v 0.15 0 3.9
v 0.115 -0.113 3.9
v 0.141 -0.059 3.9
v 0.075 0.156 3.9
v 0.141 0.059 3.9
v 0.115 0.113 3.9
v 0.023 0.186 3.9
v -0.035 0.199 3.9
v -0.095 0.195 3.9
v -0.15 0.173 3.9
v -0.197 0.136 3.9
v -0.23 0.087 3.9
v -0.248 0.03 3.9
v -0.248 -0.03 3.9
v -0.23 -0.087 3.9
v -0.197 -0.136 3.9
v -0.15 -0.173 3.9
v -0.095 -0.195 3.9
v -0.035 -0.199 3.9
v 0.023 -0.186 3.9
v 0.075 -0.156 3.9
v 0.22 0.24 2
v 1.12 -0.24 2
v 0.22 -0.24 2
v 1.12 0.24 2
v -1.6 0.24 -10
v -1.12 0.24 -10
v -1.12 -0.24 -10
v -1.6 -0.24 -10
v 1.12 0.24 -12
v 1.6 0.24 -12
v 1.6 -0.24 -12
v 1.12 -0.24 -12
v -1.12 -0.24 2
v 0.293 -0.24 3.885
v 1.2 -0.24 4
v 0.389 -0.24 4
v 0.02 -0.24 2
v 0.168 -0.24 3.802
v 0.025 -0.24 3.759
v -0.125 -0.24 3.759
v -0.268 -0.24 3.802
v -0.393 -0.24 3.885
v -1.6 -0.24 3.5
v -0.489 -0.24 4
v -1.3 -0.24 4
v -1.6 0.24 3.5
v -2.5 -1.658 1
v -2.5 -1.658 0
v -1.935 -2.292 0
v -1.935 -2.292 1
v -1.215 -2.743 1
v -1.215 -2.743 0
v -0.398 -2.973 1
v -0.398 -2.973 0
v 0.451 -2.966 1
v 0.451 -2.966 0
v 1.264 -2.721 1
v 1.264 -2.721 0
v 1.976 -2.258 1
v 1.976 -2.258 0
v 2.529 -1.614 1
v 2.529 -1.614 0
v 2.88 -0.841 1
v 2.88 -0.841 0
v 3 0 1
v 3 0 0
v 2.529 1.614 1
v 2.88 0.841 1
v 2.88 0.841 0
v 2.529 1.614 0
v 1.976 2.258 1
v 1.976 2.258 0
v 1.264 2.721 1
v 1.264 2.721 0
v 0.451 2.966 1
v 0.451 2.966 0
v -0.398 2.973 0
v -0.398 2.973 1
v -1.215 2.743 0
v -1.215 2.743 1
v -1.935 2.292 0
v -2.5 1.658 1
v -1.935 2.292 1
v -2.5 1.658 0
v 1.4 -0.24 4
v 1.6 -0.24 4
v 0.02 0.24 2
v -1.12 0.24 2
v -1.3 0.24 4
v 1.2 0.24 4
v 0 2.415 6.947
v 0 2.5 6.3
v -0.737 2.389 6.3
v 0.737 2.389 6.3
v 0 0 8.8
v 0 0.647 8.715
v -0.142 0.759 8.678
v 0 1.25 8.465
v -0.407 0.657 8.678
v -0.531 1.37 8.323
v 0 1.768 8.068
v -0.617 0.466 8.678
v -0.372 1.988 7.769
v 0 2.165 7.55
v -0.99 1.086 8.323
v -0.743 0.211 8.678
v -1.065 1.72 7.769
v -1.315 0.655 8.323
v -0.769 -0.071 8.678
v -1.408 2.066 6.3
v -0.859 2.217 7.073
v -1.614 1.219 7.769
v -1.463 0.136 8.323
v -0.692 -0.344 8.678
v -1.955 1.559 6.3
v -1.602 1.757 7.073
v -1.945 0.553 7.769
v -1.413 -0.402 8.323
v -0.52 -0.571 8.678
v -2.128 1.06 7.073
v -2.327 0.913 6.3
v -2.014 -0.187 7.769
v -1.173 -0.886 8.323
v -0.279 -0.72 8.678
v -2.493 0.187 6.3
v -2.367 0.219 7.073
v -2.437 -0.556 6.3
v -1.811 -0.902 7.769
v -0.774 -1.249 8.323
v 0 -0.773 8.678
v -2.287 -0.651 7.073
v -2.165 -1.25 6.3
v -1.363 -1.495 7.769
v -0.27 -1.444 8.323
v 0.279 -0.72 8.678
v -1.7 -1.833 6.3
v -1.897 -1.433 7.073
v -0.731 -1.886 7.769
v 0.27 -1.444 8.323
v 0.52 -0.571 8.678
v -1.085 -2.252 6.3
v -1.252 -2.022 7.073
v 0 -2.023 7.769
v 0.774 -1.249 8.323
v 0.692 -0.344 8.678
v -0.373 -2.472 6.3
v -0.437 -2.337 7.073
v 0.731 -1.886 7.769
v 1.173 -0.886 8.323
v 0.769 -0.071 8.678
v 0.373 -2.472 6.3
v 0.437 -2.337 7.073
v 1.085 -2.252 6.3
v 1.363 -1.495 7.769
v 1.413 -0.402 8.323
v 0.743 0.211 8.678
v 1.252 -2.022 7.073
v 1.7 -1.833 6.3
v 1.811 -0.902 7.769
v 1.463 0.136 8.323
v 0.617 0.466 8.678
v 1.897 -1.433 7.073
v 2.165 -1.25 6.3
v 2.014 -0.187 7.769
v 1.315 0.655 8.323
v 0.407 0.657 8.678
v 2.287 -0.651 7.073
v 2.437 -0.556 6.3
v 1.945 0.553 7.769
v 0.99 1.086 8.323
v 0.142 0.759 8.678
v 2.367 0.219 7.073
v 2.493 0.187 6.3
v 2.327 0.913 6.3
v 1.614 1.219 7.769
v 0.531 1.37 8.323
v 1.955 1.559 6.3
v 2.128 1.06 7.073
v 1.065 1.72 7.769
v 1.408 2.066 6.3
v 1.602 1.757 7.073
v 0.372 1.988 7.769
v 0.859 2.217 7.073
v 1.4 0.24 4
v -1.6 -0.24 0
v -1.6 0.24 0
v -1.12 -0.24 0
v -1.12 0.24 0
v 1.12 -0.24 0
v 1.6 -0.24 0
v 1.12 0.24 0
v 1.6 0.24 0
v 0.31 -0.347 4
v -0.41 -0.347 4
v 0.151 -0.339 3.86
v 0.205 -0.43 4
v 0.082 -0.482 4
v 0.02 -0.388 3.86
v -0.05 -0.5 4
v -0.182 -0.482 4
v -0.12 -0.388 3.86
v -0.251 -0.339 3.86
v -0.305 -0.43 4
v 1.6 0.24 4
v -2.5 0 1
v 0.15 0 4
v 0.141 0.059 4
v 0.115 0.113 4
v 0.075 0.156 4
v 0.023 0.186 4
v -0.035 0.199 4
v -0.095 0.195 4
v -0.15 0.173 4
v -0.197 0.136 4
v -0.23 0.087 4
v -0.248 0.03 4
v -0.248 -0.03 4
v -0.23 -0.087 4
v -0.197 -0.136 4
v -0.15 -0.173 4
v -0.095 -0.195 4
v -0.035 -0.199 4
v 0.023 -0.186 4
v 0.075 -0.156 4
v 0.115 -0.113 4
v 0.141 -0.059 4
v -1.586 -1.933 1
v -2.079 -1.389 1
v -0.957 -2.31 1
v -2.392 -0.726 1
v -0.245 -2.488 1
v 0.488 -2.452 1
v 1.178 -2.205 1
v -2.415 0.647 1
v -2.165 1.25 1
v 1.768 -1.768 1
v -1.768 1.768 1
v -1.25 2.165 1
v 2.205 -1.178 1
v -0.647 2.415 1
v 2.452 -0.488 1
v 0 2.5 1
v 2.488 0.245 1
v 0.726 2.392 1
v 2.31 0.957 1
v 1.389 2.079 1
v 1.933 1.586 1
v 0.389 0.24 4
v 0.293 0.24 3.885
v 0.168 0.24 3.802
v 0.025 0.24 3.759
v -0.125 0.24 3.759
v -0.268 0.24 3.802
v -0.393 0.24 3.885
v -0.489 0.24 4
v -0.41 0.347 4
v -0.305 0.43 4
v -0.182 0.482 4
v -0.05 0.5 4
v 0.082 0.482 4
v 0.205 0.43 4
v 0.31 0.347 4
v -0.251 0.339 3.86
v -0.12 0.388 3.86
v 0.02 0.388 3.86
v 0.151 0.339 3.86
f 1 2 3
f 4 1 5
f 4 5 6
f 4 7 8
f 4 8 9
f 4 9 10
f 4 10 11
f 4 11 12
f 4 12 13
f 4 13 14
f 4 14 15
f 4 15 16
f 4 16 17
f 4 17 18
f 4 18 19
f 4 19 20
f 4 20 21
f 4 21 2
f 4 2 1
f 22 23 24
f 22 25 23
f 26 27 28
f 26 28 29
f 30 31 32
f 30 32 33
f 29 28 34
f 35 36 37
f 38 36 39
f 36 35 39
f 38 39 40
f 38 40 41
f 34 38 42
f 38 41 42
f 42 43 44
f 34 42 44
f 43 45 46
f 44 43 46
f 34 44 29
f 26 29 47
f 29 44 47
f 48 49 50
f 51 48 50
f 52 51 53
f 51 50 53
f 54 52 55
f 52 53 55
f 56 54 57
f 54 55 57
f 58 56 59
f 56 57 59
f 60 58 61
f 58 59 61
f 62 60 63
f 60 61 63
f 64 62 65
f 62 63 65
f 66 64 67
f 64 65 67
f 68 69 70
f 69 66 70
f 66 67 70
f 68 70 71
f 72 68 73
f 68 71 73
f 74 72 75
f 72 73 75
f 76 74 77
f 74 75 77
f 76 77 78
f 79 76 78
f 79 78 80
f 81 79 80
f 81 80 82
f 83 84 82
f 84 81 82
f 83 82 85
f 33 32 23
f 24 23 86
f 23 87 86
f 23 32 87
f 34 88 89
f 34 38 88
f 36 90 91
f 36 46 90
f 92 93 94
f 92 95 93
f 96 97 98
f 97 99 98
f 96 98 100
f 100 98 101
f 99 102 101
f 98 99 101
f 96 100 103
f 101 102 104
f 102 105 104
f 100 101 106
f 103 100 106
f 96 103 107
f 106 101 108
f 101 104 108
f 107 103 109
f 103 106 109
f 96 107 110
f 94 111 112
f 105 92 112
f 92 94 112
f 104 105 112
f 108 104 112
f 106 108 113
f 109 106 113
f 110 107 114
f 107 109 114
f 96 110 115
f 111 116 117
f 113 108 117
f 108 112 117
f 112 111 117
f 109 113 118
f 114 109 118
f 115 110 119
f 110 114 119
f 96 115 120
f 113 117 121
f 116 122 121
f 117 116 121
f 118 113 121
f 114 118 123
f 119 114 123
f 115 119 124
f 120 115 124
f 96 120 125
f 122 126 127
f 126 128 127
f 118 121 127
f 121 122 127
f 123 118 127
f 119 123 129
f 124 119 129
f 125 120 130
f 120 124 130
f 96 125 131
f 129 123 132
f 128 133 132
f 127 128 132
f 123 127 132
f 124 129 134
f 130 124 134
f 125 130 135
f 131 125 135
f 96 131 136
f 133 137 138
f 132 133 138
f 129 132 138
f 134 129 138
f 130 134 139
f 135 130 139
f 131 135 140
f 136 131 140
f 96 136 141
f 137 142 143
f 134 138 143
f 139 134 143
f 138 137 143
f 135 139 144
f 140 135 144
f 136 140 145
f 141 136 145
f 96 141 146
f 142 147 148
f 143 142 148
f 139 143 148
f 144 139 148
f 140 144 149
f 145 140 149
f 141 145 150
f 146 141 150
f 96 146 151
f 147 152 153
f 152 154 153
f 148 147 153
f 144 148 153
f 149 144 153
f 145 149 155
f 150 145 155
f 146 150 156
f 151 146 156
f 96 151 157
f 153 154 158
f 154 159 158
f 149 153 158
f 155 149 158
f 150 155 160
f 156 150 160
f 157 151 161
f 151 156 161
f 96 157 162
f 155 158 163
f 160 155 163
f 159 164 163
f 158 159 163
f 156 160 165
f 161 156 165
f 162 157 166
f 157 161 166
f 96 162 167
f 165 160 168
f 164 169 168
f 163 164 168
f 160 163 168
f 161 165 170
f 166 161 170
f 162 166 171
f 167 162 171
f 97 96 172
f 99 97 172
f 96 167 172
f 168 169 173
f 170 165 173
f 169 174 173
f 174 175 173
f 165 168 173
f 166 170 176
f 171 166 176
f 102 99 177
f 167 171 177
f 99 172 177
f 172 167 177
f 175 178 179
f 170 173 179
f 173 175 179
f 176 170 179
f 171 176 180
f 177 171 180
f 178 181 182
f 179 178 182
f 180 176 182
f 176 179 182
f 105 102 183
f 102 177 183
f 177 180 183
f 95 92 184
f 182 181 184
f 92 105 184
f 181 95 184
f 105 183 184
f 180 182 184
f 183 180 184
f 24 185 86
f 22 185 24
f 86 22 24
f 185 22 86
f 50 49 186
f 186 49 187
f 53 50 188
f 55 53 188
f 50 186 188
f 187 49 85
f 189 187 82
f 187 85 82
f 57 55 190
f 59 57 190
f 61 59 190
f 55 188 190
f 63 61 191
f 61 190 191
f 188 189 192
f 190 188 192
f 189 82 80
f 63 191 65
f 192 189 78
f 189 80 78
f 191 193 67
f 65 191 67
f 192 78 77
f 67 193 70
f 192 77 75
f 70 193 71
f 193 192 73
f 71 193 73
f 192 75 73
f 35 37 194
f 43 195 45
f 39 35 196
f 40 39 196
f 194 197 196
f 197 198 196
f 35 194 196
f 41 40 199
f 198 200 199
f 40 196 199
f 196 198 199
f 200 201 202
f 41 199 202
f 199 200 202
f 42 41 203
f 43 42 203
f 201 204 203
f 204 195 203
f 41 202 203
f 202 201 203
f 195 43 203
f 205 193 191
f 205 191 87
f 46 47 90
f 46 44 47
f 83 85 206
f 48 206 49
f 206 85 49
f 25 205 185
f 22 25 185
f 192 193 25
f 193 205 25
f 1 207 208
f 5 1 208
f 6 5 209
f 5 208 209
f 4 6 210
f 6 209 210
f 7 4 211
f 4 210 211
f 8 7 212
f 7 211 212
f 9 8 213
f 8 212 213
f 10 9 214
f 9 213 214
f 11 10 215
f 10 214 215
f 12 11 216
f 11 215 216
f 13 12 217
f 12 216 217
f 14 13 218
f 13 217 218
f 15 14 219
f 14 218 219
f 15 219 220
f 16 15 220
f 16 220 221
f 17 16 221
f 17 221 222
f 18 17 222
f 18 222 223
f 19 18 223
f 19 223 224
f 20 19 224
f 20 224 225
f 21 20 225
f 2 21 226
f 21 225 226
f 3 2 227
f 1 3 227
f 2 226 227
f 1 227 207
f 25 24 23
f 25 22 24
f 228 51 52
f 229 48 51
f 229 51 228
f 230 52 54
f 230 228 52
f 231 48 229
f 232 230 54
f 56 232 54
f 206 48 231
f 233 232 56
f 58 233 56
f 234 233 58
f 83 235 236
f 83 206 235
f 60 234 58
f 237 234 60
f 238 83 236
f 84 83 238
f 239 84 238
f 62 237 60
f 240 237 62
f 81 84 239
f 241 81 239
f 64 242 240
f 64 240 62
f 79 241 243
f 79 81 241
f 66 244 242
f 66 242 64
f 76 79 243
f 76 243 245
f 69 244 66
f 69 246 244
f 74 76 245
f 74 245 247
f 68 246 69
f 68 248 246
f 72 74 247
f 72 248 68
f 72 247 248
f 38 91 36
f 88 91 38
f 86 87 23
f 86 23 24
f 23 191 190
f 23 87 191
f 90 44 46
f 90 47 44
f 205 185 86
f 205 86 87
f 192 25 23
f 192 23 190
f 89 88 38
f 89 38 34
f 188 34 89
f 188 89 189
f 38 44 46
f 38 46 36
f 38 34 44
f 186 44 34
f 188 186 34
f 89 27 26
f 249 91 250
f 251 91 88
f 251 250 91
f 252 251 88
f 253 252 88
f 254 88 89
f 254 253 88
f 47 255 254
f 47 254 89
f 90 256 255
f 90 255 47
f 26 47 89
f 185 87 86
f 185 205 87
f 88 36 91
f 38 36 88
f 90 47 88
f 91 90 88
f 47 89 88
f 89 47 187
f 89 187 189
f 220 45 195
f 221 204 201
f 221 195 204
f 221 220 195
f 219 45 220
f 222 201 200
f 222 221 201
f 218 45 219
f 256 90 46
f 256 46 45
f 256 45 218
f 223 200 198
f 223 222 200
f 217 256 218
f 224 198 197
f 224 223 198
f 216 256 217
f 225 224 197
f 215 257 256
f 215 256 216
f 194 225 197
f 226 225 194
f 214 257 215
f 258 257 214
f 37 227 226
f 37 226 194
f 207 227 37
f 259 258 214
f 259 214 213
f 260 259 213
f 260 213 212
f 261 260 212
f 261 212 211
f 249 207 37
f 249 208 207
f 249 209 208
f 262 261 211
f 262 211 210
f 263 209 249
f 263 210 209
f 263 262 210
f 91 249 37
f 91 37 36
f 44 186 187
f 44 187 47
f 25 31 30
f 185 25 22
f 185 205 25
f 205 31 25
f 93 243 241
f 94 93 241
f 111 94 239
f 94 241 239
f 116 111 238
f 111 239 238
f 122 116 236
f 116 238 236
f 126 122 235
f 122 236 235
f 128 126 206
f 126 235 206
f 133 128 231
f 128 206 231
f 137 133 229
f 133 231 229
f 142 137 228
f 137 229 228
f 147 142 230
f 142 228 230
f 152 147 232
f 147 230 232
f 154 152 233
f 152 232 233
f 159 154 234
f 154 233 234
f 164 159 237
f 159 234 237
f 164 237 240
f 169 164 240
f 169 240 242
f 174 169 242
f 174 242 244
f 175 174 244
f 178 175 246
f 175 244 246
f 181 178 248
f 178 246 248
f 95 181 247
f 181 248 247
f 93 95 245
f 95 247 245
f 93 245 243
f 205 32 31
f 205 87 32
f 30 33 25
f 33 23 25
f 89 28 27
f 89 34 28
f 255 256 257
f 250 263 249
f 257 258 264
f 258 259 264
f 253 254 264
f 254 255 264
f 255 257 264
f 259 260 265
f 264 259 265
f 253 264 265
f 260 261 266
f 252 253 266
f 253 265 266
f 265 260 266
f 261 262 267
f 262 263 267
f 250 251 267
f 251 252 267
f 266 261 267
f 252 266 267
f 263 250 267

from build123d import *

# Parameters (mm, degrees)
ESBO_O1_R                  = 3
RESSALTO_EXTRUS_O1_DEPTH   = 1
CORTE_EXTRUS_O1_DEPTH      = 1
ESBO_O5_W                  = 0.48
ESBO_O5_H                  = 0.48
RESSALTO_EXTRUS_O2_DEPTH   = 10
RESSALTO_EXTRUS_O2_2_DEPTH = 10
ESBO_O6_W                  = 0.48
ESBO_O6_H                  = 0.48
RESSALTO_EXTRUS_O3_DEPTH   = 2
CORTE_EXTRUS_O2_DEPTH      = 0.24
RESSALTO_EXTRUS_O4_DEPTH   = 0.24
RESSALTO_EXTRUS_O4_2_DEPTH = 0.24
ESBO_O12_R                 = 0.2
CORTE_EXTRUS_O3_DEPTH      = 0.1


with BuildPart() as part:
    # Esboço1 → Ressalto-extrusão1 (new body)
    with BuildSketch(Plane.XY):
        Circle(ESBO_O1_R)
    extrude(amount=RESSALTO_EXTRUS_O1_DEPTH)

    # Esboço3 → Revolução1 (revolve)
    with BuildSketch(Plane(origin=(0, 0, 0), x_dir=(0, 0, -1), z_dir=(1, 0, 0))):
        with BuildLine():
            Line((-1, 0), (-8.8, 0))
            ThreePointArc((-8.8, 0), (-8.067766953, 1.767766953), (-6.3, 2.5))
            Line((-6.3, 2.5), (-1, 2.5))
            Line((-1, 2.5), (-1, 0))
        make_face()
    revolve(axis=Axis((0, 0, 1), (0, 0, 1)))

    # Esboço4 → Corte-extrusão1 (cut)
    with BuildSketch(Plane(origin=(0, 0, 0), x_dir=(-1, 0, 0), z_dir=(0, 0, -1))):
        with BuildLine():
            Line((2.5, 1.658312395), (2.5, -1.658312395))
            ThreePointArc((2.5, -1.658312395), (3, 0), (2.5, 1.658312395))
        make_face()
    extrude(amount=-CORTE_EXTRUS_O1_DEPTH, mode=Mode.SUBTRACT)

    # Esboço7 → Corte-extrusão2 (cut, symmetric)
    with BuildSketch(Plane(origin=(0, 0, 0), x_dir=(1, 0, 0), z_dir=(0, 1, 0))):
        Polygon((-1.6, 0), (-1.6, -3.5), (-1.3, -4), (1.2, -4), (0.02, -2), (-1.12, -2), (-1.12, 0), align=None)
        Polygon((1.6, 0), (1.6, -4), (1.4, -4), (0.22, -2), (1.12, -2), (1.12, 0), align=None)
    extrude(amount=CORTE_EXTRUS_O2_DEPTH, both=True, mode=Mode.SUBTRACT)


with BuildPart() as body_2:
    # Esboço5 → Ressalto-extrusão2 (new body)
    with BuildSketch(Plane(origin=(0, 0, 0), x_dir=(-1, 0, 0), z_dir=(0, 0, -1))):
        with Locations((-1.36, 0)):
            Rectangle(ESBO_O5_W, ESBO_O5_H)
    extrude(amount=RESSALTO_EXTRUS_O2_DEPTH)


with BuildPart() as body_3:
    # Esboço5 → Ressalto-extrus_o2 2 (new body)
    with BuildSketch(Plane(origin=(0, 0, 0), x_dir=(-1, 0, 0), z_dir=(0, 0, -1))):
        with Locations((1.36, 0)):
            Rectangle(ESBO_O5_W, ESBO_O5_H)
    extrude(amount=RESSALTO_EXTRUS_O2_2_DEPTH)


with BuildPart() as body_4:
    # Esboço6 → Ressalto-extrusão3 (new body)
    with BuildSketch(Plane(origin=(0, 0, -10), x_dir=(-1, 0, 0), z_dir=(0, 0, -1))):
        with Locations((-1.36, 0)):
            Rectangle(ESBO_O6_W, ESBO_O6_H)
    extrude(amount=RESSALTO_EXTRUS_O3_DEPTH)


with BuildPart() as body_5:
    # Esboço8 → Ressalto-extrusão4 (new body, symmetric)
    with BuildSketch(Plane(origin=(0, 0, 0), x_dir=(1, 0, 0), z_dir=(0, 1, 0))):
        Polygon((-1.3, -4), (1.2, -4), (0.02, -2), (-1.12, -2), (-1.12, 0), (-1.6, 0), (-1.6, -3.5), align=None)
    extrude(amount=RESSALTO_EXTRUS_O4_DEPTH, both=True)

    # Combinar2: union body 3
    add(body_3.part)

    # Esboço10 → Corte-Revolução1 (revolve, cut)
    with BuildSketch(Plane(origin=(0, 0, 0), x_dir=(1, 0, 0), z_dir=(0, 1, 0))):
        with BuildLine():
            Line((-0.05, -4), (-0.05, -3.7))
            ThreePointArc((-0.05, -3.7), (-0.341547595, -3.780754009), (-0.55, -4))
            Line((-0.55, -4), (-0.05, -4))
        make_face()
    revolve(axis=Axis((-0.05, 0, 4), (0, 0, -1)), mode=Mode.SUBTRACT)


with BuildPart() as body_6:
    # Esboço8 → Ressalto-extrus_o4 2 (new body, symmetric)
    with BuildSketch(Plane(origin=(0, 0, 0), x_dir=(1, 0, 0), z_dir=(0, 1, 0))):
        Polygon((0.22, -2), (1.4, -4), (1.6, -4), (1.6, 0), (1.12, 0), (1.12, -2), align=None)
    extrude(amount=RESSALTO_EXTRUS_O4_2_DEPTH, both=True)

    # Combinar1: union body 4, body 2
    add(body_4.part)
    add(body_2.part)


with BuildPart() as body_4_2:
    # Esboço11 → Revolução2 (revolve)
    with BuildSketch(Plane(origin=(0, 0, 0), x_dir=(1, 0, 0), z_dir=(0, 1, 0))):
        with BuildLine():
            Line((-0.55, -4), (-0.05, -4))
            Line((-0.05, -4), (-0.05, -3.7))
            ThreePointArc((-0.05, -3.7), (-0.341547595, -3.780754009), (-0.55, -4))
        make_face()
    revolve(axis=Axis((-0.05, 0, 4), (0, 0, -1)))

    # Combinar3: union body 5
    add(body_5.part)

    # Esboço12 → Corte-extrusão3 (cut)
    with BuildSketch(Plane.XY.offset(4)):
        with Locations((-0.05, 0)):
            Circle(ESBO_O12_R)
    extrude(amount=-CORTE_EXTRUS_O3_DEPTH, mode=Mode.SUBTRACT)


solid = Compound([part.part, body_6.part, body_4_2.part])
